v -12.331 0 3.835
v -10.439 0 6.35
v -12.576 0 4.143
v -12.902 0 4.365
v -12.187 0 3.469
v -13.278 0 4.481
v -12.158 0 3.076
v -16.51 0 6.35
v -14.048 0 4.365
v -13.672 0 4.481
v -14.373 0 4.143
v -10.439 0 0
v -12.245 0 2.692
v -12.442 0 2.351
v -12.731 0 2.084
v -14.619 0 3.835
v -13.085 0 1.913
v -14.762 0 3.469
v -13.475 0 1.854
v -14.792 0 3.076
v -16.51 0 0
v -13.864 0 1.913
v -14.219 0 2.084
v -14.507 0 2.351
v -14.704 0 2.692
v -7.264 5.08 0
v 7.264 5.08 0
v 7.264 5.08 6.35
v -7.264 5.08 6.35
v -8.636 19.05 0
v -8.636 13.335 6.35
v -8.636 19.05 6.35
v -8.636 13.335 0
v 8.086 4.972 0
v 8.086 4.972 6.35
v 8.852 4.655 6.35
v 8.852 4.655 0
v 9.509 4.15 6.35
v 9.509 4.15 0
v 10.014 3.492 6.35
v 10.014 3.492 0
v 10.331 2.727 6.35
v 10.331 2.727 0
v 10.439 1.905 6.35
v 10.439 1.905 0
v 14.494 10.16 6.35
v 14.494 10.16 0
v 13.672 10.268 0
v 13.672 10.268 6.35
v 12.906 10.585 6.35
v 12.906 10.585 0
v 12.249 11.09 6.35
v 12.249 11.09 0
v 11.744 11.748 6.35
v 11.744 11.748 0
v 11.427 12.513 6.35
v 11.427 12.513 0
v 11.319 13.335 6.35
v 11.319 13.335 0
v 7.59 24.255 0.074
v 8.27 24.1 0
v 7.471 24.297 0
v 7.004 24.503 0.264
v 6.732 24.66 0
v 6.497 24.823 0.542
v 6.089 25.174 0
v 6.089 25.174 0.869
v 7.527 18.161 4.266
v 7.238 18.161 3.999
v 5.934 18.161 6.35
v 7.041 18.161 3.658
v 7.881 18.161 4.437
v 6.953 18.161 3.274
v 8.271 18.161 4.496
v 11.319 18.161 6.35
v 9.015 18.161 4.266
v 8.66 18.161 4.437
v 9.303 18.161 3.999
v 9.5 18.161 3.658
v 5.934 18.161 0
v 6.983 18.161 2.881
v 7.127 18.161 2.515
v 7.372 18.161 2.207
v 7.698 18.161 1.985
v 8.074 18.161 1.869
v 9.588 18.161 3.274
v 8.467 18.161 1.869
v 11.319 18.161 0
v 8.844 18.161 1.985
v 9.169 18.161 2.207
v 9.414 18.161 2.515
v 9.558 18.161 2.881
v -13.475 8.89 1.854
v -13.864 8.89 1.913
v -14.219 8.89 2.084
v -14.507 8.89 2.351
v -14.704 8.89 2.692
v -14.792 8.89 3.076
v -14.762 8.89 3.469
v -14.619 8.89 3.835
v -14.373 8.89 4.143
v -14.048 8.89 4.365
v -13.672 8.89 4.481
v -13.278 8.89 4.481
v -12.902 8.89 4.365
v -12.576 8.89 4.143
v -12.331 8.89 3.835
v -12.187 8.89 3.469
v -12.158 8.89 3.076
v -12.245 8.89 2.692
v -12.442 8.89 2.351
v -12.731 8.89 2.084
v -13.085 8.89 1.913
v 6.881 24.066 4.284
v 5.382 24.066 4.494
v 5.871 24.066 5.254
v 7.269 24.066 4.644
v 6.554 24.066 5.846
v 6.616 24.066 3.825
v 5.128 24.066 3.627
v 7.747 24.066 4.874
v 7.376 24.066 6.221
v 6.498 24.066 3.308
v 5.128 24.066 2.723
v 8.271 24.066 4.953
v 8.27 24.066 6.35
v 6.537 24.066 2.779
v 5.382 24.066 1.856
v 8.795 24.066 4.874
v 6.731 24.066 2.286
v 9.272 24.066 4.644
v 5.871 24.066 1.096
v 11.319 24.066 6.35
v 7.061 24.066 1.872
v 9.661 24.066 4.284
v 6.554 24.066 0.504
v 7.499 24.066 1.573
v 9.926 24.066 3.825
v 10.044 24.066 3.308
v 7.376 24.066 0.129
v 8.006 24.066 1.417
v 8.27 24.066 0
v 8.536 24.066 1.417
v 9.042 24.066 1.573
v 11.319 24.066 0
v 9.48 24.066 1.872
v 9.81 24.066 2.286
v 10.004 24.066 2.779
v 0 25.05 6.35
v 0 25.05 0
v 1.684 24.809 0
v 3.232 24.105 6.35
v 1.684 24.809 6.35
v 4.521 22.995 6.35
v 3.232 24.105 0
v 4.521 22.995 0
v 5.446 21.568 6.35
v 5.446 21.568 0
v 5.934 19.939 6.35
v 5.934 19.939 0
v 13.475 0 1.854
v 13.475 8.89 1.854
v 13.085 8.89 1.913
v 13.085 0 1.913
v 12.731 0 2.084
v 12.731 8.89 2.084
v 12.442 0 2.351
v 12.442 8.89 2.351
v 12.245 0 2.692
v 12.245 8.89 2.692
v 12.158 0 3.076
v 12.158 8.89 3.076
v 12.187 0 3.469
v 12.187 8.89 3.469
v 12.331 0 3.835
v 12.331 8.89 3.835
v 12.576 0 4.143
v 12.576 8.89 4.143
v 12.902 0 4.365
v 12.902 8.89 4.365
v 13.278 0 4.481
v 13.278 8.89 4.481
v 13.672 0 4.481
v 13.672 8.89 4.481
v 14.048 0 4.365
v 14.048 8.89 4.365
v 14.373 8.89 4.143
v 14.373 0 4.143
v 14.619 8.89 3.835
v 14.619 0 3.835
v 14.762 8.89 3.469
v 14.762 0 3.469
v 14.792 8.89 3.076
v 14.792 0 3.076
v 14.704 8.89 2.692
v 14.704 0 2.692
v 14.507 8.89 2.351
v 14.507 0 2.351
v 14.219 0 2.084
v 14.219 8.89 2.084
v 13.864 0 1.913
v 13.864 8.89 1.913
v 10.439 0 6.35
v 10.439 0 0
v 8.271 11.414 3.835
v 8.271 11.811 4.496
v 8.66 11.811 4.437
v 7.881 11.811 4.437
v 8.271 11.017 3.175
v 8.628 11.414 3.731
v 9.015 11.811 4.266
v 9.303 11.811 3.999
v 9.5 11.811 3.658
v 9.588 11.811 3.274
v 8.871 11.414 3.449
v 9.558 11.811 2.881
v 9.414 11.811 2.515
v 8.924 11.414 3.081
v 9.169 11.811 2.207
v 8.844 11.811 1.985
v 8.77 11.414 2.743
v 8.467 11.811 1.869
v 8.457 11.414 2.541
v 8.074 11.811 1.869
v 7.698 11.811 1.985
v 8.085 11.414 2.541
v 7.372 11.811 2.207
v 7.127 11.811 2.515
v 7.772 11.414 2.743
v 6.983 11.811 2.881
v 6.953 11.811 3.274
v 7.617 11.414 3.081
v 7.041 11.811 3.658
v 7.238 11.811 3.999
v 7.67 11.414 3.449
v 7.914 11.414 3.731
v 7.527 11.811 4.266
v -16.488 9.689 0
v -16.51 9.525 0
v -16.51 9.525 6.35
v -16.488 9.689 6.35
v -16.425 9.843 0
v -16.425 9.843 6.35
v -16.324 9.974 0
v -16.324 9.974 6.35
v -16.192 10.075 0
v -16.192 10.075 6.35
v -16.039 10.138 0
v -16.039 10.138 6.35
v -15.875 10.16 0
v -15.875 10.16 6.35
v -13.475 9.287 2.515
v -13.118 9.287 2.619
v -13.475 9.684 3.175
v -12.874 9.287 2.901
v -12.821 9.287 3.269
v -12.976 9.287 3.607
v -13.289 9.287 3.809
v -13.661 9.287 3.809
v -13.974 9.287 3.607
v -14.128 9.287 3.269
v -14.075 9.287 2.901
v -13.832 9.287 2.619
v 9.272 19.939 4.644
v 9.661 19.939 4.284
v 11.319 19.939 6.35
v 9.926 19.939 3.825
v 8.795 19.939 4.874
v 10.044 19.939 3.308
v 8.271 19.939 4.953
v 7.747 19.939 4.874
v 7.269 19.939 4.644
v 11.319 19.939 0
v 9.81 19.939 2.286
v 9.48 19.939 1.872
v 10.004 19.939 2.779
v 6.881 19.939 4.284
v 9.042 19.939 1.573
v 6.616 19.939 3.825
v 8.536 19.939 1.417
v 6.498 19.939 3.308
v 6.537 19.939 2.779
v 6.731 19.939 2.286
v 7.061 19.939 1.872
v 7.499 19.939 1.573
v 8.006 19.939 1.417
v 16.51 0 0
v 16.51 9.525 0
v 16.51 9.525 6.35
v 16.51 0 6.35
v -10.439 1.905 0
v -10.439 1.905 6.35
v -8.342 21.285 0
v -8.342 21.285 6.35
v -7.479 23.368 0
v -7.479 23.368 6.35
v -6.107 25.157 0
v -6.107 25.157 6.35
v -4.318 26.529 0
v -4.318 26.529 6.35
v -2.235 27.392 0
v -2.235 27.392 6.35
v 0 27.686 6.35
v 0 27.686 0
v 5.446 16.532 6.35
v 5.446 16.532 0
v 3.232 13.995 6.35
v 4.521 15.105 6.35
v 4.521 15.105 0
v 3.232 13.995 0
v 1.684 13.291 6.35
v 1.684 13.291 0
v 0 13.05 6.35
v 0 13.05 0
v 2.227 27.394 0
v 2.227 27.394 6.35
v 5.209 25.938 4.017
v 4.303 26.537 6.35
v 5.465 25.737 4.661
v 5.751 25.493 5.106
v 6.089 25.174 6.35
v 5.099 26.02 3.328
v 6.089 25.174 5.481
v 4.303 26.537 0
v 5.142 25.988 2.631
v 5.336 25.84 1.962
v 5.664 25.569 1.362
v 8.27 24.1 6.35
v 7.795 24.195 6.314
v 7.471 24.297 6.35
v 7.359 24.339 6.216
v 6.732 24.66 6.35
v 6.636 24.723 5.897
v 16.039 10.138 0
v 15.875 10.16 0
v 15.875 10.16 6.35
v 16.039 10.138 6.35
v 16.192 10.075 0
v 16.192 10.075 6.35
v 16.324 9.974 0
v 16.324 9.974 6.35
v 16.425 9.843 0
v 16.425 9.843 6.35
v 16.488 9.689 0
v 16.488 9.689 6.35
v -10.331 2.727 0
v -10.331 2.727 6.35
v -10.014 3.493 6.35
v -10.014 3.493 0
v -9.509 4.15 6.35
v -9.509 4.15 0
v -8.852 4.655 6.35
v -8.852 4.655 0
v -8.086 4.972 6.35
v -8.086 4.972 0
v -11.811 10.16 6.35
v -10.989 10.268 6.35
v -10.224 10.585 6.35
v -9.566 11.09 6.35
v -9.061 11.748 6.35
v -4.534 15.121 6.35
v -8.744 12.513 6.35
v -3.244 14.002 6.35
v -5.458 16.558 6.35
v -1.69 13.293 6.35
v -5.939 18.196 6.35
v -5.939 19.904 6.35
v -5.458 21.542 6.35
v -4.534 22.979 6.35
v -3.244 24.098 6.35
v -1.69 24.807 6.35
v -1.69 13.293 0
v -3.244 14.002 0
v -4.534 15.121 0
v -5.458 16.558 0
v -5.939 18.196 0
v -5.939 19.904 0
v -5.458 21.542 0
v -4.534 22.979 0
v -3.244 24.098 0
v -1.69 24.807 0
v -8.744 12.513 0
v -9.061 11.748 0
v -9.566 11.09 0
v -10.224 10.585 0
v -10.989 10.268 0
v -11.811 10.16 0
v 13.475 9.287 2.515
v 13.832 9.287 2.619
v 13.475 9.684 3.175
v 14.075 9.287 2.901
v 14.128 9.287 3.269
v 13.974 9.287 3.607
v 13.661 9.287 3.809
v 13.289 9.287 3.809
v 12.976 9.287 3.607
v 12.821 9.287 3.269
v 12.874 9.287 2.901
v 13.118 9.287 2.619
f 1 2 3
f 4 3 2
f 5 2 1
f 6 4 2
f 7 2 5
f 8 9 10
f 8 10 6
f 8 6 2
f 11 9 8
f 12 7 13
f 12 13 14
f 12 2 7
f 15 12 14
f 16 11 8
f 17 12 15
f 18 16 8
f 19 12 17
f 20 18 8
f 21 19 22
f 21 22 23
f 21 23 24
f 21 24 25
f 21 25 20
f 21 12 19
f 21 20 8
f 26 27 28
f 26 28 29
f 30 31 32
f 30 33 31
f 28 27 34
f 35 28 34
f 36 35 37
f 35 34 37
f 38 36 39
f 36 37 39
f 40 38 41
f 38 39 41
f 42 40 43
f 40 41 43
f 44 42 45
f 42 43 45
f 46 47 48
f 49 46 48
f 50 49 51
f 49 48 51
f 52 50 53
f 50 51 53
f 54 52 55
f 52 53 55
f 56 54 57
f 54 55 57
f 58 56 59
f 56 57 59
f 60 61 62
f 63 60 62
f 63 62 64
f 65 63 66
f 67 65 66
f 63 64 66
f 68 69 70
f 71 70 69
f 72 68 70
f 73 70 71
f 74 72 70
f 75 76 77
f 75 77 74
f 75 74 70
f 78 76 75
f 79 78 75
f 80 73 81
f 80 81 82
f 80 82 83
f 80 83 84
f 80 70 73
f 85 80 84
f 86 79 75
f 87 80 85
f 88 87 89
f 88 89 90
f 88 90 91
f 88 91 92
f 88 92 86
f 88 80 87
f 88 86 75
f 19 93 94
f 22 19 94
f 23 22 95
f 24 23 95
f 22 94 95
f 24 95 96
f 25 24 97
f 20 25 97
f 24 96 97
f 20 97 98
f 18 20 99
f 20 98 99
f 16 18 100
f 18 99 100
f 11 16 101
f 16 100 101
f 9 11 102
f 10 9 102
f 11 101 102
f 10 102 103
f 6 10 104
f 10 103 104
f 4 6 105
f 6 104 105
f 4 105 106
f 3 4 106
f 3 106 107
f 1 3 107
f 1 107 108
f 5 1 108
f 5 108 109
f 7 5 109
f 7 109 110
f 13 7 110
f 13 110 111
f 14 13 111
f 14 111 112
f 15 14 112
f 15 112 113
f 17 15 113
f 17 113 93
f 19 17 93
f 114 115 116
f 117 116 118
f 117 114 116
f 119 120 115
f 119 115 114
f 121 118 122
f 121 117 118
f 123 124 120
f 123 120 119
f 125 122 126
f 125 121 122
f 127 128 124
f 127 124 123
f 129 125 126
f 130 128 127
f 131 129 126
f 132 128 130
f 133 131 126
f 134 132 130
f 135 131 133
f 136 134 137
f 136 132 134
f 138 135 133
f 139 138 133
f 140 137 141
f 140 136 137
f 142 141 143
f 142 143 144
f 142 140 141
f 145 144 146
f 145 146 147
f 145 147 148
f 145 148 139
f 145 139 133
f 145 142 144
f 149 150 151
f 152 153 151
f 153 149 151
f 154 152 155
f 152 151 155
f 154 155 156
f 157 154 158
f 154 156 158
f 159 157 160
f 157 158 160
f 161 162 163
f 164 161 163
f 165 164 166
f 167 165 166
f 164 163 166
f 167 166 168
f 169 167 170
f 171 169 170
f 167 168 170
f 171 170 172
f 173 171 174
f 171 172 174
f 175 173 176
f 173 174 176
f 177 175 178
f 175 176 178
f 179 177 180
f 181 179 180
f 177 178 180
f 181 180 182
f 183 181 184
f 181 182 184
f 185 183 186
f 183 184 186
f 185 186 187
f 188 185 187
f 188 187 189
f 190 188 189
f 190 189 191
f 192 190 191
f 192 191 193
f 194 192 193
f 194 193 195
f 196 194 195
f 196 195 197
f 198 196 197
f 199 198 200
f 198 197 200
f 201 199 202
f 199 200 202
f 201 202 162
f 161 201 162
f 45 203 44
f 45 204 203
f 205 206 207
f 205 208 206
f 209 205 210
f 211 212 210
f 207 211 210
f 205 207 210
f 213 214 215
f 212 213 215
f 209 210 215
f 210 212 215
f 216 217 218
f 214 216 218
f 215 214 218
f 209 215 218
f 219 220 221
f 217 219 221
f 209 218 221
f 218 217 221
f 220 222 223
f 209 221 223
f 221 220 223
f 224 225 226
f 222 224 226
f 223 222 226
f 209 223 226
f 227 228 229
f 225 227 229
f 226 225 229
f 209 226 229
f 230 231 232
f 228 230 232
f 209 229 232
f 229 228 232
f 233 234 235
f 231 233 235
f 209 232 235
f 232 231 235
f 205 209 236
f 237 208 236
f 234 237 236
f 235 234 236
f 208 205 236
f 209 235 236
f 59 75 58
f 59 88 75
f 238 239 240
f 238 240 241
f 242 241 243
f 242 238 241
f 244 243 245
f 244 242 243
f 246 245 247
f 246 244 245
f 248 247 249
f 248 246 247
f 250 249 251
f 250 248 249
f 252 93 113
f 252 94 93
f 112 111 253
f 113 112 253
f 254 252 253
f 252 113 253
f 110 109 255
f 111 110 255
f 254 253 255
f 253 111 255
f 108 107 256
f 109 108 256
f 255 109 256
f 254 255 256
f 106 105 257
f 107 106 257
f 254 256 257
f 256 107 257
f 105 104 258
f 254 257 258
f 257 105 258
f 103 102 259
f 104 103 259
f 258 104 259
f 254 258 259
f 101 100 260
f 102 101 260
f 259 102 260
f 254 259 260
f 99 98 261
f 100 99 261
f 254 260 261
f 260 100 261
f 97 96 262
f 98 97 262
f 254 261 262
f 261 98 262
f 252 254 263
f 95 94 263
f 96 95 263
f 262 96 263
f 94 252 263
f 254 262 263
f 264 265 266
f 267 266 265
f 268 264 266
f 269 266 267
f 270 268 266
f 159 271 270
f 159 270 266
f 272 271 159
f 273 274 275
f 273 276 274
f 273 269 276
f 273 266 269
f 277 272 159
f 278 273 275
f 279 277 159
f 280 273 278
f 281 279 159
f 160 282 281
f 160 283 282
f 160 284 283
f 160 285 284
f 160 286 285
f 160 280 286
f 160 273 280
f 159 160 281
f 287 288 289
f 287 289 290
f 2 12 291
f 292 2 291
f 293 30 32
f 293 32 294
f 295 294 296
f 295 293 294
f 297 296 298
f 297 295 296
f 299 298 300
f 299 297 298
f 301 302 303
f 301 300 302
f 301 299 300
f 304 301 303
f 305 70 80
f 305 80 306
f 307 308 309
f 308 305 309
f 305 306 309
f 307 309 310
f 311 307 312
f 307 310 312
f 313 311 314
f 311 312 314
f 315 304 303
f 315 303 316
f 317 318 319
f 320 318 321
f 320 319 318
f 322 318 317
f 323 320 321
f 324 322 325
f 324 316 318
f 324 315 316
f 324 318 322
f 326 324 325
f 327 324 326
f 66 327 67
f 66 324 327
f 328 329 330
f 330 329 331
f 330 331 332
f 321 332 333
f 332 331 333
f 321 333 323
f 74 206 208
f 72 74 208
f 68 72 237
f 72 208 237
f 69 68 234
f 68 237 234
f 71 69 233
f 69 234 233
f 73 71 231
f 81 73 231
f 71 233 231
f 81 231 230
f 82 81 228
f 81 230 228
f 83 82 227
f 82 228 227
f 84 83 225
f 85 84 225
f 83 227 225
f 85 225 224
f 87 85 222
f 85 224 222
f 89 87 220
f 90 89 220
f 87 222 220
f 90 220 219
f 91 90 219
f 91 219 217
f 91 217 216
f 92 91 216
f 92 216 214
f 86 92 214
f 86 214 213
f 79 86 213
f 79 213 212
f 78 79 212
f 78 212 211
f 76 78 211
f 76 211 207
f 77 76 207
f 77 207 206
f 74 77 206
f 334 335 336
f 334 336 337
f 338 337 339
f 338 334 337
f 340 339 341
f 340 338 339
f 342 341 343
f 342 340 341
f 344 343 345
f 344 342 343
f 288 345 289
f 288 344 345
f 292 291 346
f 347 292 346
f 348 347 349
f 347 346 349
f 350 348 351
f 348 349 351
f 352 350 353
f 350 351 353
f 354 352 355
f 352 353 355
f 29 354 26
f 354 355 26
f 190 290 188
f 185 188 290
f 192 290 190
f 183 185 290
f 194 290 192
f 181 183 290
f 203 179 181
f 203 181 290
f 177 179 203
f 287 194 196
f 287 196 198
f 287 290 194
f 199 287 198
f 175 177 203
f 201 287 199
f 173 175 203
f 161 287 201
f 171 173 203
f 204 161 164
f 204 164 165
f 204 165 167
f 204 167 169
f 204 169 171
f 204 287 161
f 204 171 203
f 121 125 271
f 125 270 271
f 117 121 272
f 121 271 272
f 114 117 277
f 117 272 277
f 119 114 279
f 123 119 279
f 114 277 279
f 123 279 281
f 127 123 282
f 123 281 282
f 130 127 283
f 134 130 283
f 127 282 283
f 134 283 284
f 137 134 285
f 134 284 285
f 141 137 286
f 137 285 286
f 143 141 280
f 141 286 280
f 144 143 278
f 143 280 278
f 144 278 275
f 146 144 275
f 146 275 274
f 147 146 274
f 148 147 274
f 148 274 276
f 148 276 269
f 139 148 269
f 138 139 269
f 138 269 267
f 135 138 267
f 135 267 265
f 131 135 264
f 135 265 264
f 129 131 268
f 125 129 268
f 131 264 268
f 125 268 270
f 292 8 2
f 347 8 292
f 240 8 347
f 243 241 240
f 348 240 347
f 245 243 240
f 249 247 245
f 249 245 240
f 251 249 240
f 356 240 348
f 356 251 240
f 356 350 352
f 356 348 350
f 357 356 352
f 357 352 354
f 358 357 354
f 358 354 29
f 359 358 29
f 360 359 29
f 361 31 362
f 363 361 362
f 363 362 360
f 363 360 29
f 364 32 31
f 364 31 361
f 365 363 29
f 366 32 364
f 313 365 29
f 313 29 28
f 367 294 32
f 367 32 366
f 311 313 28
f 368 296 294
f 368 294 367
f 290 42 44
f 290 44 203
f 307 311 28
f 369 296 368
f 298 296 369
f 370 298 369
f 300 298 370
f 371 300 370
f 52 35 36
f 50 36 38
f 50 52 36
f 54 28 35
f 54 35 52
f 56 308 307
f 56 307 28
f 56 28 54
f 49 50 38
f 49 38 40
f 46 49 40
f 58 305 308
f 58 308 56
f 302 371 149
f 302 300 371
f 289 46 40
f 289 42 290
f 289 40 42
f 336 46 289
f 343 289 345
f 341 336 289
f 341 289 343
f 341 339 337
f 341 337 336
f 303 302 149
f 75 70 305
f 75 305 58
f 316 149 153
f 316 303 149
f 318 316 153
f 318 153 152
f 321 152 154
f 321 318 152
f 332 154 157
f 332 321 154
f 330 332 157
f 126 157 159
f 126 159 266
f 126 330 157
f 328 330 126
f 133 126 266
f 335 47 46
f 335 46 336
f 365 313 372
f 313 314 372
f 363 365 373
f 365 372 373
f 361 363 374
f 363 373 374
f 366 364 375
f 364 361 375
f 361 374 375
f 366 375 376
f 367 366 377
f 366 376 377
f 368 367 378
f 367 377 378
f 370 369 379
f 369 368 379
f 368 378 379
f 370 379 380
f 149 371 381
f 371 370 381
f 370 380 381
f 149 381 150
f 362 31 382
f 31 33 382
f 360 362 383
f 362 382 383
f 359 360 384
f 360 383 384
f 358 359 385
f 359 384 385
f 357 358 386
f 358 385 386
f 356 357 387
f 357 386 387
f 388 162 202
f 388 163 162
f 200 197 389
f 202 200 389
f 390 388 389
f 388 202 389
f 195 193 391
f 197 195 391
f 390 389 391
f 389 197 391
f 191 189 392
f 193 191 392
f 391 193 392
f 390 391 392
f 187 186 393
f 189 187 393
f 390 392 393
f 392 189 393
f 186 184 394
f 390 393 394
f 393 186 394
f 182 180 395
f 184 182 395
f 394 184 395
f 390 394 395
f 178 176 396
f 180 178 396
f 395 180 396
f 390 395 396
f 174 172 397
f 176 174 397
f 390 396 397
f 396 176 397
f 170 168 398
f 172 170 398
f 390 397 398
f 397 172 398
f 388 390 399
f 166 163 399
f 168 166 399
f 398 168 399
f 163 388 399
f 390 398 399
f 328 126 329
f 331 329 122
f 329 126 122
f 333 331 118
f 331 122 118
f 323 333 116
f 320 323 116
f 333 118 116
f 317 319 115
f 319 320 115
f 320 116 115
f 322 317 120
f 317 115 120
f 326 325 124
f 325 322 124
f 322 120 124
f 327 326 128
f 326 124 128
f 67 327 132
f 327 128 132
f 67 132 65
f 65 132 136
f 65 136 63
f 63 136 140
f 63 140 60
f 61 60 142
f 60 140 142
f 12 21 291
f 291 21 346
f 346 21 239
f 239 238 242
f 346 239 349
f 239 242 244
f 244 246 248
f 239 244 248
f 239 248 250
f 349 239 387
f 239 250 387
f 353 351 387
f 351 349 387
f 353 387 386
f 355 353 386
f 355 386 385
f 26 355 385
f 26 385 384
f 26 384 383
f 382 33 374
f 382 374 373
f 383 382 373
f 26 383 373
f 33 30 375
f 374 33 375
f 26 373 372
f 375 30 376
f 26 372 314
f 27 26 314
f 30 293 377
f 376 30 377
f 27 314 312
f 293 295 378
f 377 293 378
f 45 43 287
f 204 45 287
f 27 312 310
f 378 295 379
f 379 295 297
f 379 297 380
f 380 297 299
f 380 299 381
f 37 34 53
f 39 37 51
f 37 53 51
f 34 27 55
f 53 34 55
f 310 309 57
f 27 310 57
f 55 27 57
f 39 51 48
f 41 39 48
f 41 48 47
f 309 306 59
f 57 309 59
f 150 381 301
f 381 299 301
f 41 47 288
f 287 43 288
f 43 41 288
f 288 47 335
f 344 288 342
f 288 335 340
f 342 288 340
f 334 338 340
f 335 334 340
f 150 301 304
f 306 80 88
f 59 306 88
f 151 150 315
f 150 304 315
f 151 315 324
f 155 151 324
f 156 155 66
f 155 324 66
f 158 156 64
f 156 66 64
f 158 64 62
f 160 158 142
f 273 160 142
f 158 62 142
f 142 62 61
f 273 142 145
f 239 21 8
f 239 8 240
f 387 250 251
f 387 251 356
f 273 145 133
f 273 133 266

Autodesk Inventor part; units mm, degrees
ref_plane "YZ Plane" through (0, 0, 0) normal (1, 0, 0) x (0, 1, 0)
ref_plane "XZ Plane" through (0, 0, 0) normal (0, 1, 0) x (-1, 0, 0)
ref_plane "XY Plane" through (0, 0, 0) normal (0, 0, 1) x (1, 0, 0)
sketch "Sketch1" plane through (0, 0, 0) normal (0, 0, 1) x (1, 0, 0)
  line L0 (0, 0) -> (0, 14.864) construction
  arc A0 (0, 25.05) -> (0, 13.05) centre (0, 19.05) ccw
  line L1 (-10.4394, 0) -> (-10.4394, 1.905)
  line L2 (-7.2644, 5.08) -> (0, 5.08)
  line L3 (-16.51, 0) -> (-16.51, 9.525)
  line L4 (-15.875, 10.16) -> (-11.811, 10.16)
  line L5 (-8.636, 13.335) -> (-8.636, 19.05)
  arc A1 (0, 27.686) -> (-8.636, 19.05) centre (0, 19.05) ccw
  arc A2 (-7.2644, 5.08) -> (-10.4394, 1.905) centre (-7.2644, 1.905) ccw
  line L6 (-10.4394, 0) -> (-16.51, 0)
  arc A3 (-15.875, 10.16) -> (-16.51, 9.525) centre (-15.875, 9.525) ccw
  arc A4 (-11.811, 10.16) -> (-8.636, 13.335) centre (-11.811, 13.335) ccw
  arc A5 (5.9338, 19.939) -> (0, 25.05) centre (0, 19.05) ccw
  arc A6 (0, 13.05) -> (5.9338, 18.161) centre (0, 19.05) ccw
  arc A7 (6.0886, 25.1745) -> (0, 27.686) centre (0, 19.05) ccw
  line L7 (8.7747, 24.0665) -> (11.3186, 24.0665)
  line L8 (11.3186, 24.0665) -> (11.3186, 19.939)
  line L9 (11.3186, 19.939) -> (5.9338, 19.939)
  line L10 (5.9338, 18.161) -> (11.3186, 18.161)
  line L11 (11.3186, 18.161) -> (11.3186, 13.335)
  line L12 (14.4936, 10.16) -> (15.875, 10.16)
  line L13 (16.51, 9.525) -> (16.51, 0)
  line L14 (16.51, 0) -> (10.4394, 0)
  line L15 (10.4394, 0) -> (10.4394, 1.905)
  line L16 (7.2644, 5.08) -> (0, 5.08)
  arc A8 (10.4394, 1.905) -> (7.2644, 5.08) centre (7.2644, 1.905) ccw
  arc A9 (11.3186, 13.335) -> (14.4936, 10.16) centre (14.4936, 13.335) ccw
  arc A10 (16.51, 9.525) -> (15.875, 10.16) centre (15.875, 9.525) ccw
  line L17 (0, 19.05) -> (12.673, 19.05) construction
  arc A11 (6.0886, 25.1745) -> (8.7747, 24.0665) centre (8.7747, 27.8765) ccw
  point P0 (7.0296, 24.0665)
  dimension "d0" = 19.05
  dimension "d1" = 6
  dimension "d2" = 27.686
  dimension "d3" = 3.175
  dimension "d4" = 0.635
  dimension "d5" = 3.175
  dimension "d6" = 33.02
  dimension "d7" = 10.16
  dimension "d8" = 6.0706
  dimension "d9" = 5.08
  dimension "d10" = 3.175
  dimension "d11" = 0.635
  dimension "d12" = 5.3848
  dimension "d13" = 1.778
  dimension "d14" = 3.81
  dimension "d15" = 4.1275
extrude "Extrusion1" add sketch "Sketch1" along normal blind 6.35
sketch "Sketch3" plane through (8.7747, 24.0665, 0) normal (0, 1, 0) x (1, 0, 0)
  line L0 (0, 0) -> (2.5438, 0) projected
  line L1 (2.5438, -6.35) -> (0, -6.35) projected
  line L2 (2.5438, 0) -> (2.5438, -6.35) projected
  line L3 (2.5438, -3.175) -> (-0.5042, -3.175) construction
  line L4 (0, 0) -> (-0.5042, 0)
  line L5 (0, -6.35) -> (-0.5042, -6.35)
  arc A0 (-0.5042, 0) -> (-0.5042, -6.35) centre (-0.5042, -3.175) ccw
  point P0 (-8.7747, 0)
  dimension "d22" = 3.048
extrude "Extrusion2" cut sketch "Sketch3" along normal blind 6.35
sketch "Sketch4" plane through (11.3186, 24.0665, 6.35) normal (0, 1, 0) x (1, 0, 0)
  arc A0 (-3.048, 6.35) -> (-3.048, 0) centre (-3.048, 3.175) ccw projected
  point P0 (-11.3186, 6.35)
hole "Hole1" at (8.2706, 24.0665, 3.175) direction (0, -1, 0) diameter 3.556 depth 5.08
sketch "Sketch5" plane through (5.9338, 18.161, 0) normal (0, 1, 0) x (1, 0, 0)
  circle A0 centre (2.3368, -3.175) radius 1.778 projected
  point P0 (-5.9338, 0)
hole "Hole2" at (8.2706, 18.161, 3.175) direction (0, -1, 0) diameter 2.6416 depth 6.35 tip angle 118 thread size "6-32 UNC" class "2B" standard "ANSI Unified Screw Threads"
sketch "Sketch6" plane through (-16.51, 0, 0) normal (0, -1, 0) x (1, 0, 0)
  line L0 (33.02, 0) -> (26.9494, 0) projected
  line L1 (33.02, 0) -> (33.02, 6.35) projected
  line L2 (26.9494, 6.35) -> (33.02, 6.35) projected
  line L3 (26.9494, 0) -> (26.9494, 6.35) projected
  line L4 (0, 0) -> (6.0706, 6.35) construction
  line L5 (26.9494, 0) -> (33.02, 6.35) construction
  point P0 (16.51, 0)
  point P1 (3.0353, 3.175)
  point P2 (29.9847, 3.175)
hole "Hole3" at (-13.4747, 0, 3.175) at (13.4747, 0, 3.175) direction (0, 1, 0) diameter 2.6416 depth 8.89 tip angle 118 thread size "6-32 UNC" class "2B" standard "ANSI Unified Screw Threads"
properties part number "535638-12mmClampingBracket"
